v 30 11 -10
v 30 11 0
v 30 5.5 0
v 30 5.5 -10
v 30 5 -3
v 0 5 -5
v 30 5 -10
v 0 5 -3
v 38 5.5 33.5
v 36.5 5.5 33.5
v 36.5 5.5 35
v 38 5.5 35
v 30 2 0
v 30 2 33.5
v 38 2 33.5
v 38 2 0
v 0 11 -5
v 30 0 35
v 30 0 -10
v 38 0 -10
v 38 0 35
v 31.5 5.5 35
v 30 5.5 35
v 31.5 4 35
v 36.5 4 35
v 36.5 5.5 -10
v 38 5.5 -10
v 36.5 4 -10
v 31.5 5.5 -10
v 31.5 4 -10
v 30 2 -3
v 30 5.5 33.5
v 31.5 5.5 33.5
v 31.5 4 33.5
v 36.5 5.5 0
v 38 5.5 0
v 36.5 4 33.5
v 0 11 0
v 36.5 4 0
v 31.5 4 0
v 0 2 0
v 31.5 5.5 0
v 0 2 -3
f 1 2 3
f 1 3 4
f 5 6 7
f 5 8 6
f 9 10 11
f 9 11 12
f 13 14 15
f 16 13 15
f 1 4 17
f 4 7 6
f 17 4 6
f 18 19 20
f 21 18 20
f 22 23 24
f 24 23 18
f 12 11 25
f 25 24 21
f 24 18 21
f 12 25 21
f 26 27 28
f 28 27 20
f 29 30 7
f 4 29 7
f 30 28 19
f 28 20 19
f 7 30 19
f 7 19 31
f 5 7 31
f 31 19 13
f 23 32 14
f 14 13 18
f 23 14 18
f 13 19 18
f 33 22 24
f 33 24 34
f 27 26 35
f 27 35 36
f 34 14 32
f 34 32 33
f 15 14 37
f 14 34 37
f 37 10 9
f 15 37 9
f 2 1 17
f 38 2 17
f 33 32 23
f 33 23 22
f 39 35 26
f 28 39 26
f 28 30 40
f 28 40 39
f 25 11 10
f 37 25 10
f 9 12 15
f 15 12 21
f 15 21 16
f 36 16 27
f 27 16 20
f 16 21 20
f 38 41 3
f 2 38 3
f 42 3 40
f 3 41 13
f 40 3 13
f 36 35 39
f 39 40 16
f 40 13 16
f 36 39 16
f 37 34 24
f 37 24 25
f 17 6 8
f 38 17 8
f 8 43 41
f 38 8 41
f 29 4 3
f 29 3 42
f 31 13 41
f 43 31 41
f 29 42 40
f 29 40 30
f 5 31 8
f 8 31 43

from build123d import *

# Parameters (mm, degrees)
BOSS_EXTRUDE1_DEPTH = 12
SKETCH2_W           = 8
SKETCH2_H           = 33.5
CUT_EXTRUDE1_DEPTH  = 10
SKETCH3_W           = 8
SKETCH3_H           = 45
CUT_EXTRUDE2_DEPTH  = 6.5
SKETCH4_W           = 5
SKETCH4_H           = 10
CUT_EXTRUDE3_DEPTH  = 1.5
SKETCH5_W           = 5
SKETCH5_H           = 1.5
CUT_EXTRUDE4_DEPTH  = 1.5
CUT_EXTRUDE5_DEPTH  = 2
CUT_EXTRUDE7_DEPTH  = 1
CUT_EXTRUDE9_DEPTH  = 3


with BuildPart() as part:
    # Sketch1 → Boss-Extrude1 (new body)
    with BuildSketch(Plane(origin=(0, 0, 0), x_dir=(1, 0, 0), z_dir=(0, 1, 0))):
        Polygon((0, 0), (30, 0), (30, -35), (38, -35), (38, 10), (30, 10), (0, 5), align=None)
    extrude(amount=BOSS_EXTRUDE1_DEPTH)

    # Sketch2 → Cut-Extrude1 (cut)
    with BuildSketch(Plane(origin=(0, 12, 0), x_dir=(1, 0, 0), z_dir=(0, 1, 0))):
        with Locations((34, -16.75)):
            Rectangle(SKETCH2_W, SKETCH2_H)
    extrude(amount=-CUT_EXTRUDE1_DEPTH, mode=Mode.SUBTRACT)

    # Sketch3 → Cut-Extrude2 (cut)
    with BuildSketch(Plane(origin=(0, 12, 0), x_dir=(1, 0, 0), z_dir=(0, 1, 0))):
        with Locations((34, -12.5)):
            Rectangle(SKETCH3_W, SKETCH3_H)
    extrude(amount=-CUT_EXTRUDE2_DEPTH, mode=Mode.SUBTRACT)

    # Sketch4 → Cut-Extrude3 (cut)
    with BuildSketch(Plane(origin=(0, 5.5, 0), x_dir=(1, 0, 0), z_dir=(0, 1, 0))):
        with Locations((34, 5)):
            Rectangle(SKETCH4_W, SKETCH4_H)
    extrude(amount=-CUT_EXTRUDE3_DEPTH, mode=Mode.SUBTRACT)

    # Sketch5 → Cut-Extrude4 (cut)
    with BuildSketch(Plane(origin=(0, 5.5, 0), x_dir=(1, 0, 0), z_dir=(0, 1, 0))):
        with Locations((34, -34.25)):
            Rectangle(SKETCH5_W, SKETCH5_H)
    extrude(amount=-CUT_EXTRUDE4_DEPTH, mode=Mode.SUBTRACT)

    # Sketch6 → Cut-Extrude5 (cut)
    with BuildSketch(Plane.XZ):
        Polygon((0, 0), (30, 0), (30, -10), (0, -5), align=None)
    extrude(amount=-CUT_EXTRUDE5_DEPTH, mode=Mode.SUBTRACT)

    # Sketch7 → Cut-Extrude7 (cut)
    with BuildSketch(Plane(origin=(0, 12, 0), x_dir=(1, 0, 0), z_dir=(0, 1, 0))):
        Polygon((0, 5), (30, 10), (30, 0), (0, 0), align=None)
    extrude(amount=-CUT_EXTRUDE7_DEPTH, mode=Mode.SUBTRACT)

    # Sketch10 → Cut-Extrude9 (cut)
    with BuildSketch(Plane.XZ.offset(-2)):
        Polygon((0, -5), (30, -10), (30, -3), (0, -3), align=None)
    extrude(amount=-CUT_EXTRUDE9_DEPTH, mode=Mode.SUBTRACT)


solid = part.part
